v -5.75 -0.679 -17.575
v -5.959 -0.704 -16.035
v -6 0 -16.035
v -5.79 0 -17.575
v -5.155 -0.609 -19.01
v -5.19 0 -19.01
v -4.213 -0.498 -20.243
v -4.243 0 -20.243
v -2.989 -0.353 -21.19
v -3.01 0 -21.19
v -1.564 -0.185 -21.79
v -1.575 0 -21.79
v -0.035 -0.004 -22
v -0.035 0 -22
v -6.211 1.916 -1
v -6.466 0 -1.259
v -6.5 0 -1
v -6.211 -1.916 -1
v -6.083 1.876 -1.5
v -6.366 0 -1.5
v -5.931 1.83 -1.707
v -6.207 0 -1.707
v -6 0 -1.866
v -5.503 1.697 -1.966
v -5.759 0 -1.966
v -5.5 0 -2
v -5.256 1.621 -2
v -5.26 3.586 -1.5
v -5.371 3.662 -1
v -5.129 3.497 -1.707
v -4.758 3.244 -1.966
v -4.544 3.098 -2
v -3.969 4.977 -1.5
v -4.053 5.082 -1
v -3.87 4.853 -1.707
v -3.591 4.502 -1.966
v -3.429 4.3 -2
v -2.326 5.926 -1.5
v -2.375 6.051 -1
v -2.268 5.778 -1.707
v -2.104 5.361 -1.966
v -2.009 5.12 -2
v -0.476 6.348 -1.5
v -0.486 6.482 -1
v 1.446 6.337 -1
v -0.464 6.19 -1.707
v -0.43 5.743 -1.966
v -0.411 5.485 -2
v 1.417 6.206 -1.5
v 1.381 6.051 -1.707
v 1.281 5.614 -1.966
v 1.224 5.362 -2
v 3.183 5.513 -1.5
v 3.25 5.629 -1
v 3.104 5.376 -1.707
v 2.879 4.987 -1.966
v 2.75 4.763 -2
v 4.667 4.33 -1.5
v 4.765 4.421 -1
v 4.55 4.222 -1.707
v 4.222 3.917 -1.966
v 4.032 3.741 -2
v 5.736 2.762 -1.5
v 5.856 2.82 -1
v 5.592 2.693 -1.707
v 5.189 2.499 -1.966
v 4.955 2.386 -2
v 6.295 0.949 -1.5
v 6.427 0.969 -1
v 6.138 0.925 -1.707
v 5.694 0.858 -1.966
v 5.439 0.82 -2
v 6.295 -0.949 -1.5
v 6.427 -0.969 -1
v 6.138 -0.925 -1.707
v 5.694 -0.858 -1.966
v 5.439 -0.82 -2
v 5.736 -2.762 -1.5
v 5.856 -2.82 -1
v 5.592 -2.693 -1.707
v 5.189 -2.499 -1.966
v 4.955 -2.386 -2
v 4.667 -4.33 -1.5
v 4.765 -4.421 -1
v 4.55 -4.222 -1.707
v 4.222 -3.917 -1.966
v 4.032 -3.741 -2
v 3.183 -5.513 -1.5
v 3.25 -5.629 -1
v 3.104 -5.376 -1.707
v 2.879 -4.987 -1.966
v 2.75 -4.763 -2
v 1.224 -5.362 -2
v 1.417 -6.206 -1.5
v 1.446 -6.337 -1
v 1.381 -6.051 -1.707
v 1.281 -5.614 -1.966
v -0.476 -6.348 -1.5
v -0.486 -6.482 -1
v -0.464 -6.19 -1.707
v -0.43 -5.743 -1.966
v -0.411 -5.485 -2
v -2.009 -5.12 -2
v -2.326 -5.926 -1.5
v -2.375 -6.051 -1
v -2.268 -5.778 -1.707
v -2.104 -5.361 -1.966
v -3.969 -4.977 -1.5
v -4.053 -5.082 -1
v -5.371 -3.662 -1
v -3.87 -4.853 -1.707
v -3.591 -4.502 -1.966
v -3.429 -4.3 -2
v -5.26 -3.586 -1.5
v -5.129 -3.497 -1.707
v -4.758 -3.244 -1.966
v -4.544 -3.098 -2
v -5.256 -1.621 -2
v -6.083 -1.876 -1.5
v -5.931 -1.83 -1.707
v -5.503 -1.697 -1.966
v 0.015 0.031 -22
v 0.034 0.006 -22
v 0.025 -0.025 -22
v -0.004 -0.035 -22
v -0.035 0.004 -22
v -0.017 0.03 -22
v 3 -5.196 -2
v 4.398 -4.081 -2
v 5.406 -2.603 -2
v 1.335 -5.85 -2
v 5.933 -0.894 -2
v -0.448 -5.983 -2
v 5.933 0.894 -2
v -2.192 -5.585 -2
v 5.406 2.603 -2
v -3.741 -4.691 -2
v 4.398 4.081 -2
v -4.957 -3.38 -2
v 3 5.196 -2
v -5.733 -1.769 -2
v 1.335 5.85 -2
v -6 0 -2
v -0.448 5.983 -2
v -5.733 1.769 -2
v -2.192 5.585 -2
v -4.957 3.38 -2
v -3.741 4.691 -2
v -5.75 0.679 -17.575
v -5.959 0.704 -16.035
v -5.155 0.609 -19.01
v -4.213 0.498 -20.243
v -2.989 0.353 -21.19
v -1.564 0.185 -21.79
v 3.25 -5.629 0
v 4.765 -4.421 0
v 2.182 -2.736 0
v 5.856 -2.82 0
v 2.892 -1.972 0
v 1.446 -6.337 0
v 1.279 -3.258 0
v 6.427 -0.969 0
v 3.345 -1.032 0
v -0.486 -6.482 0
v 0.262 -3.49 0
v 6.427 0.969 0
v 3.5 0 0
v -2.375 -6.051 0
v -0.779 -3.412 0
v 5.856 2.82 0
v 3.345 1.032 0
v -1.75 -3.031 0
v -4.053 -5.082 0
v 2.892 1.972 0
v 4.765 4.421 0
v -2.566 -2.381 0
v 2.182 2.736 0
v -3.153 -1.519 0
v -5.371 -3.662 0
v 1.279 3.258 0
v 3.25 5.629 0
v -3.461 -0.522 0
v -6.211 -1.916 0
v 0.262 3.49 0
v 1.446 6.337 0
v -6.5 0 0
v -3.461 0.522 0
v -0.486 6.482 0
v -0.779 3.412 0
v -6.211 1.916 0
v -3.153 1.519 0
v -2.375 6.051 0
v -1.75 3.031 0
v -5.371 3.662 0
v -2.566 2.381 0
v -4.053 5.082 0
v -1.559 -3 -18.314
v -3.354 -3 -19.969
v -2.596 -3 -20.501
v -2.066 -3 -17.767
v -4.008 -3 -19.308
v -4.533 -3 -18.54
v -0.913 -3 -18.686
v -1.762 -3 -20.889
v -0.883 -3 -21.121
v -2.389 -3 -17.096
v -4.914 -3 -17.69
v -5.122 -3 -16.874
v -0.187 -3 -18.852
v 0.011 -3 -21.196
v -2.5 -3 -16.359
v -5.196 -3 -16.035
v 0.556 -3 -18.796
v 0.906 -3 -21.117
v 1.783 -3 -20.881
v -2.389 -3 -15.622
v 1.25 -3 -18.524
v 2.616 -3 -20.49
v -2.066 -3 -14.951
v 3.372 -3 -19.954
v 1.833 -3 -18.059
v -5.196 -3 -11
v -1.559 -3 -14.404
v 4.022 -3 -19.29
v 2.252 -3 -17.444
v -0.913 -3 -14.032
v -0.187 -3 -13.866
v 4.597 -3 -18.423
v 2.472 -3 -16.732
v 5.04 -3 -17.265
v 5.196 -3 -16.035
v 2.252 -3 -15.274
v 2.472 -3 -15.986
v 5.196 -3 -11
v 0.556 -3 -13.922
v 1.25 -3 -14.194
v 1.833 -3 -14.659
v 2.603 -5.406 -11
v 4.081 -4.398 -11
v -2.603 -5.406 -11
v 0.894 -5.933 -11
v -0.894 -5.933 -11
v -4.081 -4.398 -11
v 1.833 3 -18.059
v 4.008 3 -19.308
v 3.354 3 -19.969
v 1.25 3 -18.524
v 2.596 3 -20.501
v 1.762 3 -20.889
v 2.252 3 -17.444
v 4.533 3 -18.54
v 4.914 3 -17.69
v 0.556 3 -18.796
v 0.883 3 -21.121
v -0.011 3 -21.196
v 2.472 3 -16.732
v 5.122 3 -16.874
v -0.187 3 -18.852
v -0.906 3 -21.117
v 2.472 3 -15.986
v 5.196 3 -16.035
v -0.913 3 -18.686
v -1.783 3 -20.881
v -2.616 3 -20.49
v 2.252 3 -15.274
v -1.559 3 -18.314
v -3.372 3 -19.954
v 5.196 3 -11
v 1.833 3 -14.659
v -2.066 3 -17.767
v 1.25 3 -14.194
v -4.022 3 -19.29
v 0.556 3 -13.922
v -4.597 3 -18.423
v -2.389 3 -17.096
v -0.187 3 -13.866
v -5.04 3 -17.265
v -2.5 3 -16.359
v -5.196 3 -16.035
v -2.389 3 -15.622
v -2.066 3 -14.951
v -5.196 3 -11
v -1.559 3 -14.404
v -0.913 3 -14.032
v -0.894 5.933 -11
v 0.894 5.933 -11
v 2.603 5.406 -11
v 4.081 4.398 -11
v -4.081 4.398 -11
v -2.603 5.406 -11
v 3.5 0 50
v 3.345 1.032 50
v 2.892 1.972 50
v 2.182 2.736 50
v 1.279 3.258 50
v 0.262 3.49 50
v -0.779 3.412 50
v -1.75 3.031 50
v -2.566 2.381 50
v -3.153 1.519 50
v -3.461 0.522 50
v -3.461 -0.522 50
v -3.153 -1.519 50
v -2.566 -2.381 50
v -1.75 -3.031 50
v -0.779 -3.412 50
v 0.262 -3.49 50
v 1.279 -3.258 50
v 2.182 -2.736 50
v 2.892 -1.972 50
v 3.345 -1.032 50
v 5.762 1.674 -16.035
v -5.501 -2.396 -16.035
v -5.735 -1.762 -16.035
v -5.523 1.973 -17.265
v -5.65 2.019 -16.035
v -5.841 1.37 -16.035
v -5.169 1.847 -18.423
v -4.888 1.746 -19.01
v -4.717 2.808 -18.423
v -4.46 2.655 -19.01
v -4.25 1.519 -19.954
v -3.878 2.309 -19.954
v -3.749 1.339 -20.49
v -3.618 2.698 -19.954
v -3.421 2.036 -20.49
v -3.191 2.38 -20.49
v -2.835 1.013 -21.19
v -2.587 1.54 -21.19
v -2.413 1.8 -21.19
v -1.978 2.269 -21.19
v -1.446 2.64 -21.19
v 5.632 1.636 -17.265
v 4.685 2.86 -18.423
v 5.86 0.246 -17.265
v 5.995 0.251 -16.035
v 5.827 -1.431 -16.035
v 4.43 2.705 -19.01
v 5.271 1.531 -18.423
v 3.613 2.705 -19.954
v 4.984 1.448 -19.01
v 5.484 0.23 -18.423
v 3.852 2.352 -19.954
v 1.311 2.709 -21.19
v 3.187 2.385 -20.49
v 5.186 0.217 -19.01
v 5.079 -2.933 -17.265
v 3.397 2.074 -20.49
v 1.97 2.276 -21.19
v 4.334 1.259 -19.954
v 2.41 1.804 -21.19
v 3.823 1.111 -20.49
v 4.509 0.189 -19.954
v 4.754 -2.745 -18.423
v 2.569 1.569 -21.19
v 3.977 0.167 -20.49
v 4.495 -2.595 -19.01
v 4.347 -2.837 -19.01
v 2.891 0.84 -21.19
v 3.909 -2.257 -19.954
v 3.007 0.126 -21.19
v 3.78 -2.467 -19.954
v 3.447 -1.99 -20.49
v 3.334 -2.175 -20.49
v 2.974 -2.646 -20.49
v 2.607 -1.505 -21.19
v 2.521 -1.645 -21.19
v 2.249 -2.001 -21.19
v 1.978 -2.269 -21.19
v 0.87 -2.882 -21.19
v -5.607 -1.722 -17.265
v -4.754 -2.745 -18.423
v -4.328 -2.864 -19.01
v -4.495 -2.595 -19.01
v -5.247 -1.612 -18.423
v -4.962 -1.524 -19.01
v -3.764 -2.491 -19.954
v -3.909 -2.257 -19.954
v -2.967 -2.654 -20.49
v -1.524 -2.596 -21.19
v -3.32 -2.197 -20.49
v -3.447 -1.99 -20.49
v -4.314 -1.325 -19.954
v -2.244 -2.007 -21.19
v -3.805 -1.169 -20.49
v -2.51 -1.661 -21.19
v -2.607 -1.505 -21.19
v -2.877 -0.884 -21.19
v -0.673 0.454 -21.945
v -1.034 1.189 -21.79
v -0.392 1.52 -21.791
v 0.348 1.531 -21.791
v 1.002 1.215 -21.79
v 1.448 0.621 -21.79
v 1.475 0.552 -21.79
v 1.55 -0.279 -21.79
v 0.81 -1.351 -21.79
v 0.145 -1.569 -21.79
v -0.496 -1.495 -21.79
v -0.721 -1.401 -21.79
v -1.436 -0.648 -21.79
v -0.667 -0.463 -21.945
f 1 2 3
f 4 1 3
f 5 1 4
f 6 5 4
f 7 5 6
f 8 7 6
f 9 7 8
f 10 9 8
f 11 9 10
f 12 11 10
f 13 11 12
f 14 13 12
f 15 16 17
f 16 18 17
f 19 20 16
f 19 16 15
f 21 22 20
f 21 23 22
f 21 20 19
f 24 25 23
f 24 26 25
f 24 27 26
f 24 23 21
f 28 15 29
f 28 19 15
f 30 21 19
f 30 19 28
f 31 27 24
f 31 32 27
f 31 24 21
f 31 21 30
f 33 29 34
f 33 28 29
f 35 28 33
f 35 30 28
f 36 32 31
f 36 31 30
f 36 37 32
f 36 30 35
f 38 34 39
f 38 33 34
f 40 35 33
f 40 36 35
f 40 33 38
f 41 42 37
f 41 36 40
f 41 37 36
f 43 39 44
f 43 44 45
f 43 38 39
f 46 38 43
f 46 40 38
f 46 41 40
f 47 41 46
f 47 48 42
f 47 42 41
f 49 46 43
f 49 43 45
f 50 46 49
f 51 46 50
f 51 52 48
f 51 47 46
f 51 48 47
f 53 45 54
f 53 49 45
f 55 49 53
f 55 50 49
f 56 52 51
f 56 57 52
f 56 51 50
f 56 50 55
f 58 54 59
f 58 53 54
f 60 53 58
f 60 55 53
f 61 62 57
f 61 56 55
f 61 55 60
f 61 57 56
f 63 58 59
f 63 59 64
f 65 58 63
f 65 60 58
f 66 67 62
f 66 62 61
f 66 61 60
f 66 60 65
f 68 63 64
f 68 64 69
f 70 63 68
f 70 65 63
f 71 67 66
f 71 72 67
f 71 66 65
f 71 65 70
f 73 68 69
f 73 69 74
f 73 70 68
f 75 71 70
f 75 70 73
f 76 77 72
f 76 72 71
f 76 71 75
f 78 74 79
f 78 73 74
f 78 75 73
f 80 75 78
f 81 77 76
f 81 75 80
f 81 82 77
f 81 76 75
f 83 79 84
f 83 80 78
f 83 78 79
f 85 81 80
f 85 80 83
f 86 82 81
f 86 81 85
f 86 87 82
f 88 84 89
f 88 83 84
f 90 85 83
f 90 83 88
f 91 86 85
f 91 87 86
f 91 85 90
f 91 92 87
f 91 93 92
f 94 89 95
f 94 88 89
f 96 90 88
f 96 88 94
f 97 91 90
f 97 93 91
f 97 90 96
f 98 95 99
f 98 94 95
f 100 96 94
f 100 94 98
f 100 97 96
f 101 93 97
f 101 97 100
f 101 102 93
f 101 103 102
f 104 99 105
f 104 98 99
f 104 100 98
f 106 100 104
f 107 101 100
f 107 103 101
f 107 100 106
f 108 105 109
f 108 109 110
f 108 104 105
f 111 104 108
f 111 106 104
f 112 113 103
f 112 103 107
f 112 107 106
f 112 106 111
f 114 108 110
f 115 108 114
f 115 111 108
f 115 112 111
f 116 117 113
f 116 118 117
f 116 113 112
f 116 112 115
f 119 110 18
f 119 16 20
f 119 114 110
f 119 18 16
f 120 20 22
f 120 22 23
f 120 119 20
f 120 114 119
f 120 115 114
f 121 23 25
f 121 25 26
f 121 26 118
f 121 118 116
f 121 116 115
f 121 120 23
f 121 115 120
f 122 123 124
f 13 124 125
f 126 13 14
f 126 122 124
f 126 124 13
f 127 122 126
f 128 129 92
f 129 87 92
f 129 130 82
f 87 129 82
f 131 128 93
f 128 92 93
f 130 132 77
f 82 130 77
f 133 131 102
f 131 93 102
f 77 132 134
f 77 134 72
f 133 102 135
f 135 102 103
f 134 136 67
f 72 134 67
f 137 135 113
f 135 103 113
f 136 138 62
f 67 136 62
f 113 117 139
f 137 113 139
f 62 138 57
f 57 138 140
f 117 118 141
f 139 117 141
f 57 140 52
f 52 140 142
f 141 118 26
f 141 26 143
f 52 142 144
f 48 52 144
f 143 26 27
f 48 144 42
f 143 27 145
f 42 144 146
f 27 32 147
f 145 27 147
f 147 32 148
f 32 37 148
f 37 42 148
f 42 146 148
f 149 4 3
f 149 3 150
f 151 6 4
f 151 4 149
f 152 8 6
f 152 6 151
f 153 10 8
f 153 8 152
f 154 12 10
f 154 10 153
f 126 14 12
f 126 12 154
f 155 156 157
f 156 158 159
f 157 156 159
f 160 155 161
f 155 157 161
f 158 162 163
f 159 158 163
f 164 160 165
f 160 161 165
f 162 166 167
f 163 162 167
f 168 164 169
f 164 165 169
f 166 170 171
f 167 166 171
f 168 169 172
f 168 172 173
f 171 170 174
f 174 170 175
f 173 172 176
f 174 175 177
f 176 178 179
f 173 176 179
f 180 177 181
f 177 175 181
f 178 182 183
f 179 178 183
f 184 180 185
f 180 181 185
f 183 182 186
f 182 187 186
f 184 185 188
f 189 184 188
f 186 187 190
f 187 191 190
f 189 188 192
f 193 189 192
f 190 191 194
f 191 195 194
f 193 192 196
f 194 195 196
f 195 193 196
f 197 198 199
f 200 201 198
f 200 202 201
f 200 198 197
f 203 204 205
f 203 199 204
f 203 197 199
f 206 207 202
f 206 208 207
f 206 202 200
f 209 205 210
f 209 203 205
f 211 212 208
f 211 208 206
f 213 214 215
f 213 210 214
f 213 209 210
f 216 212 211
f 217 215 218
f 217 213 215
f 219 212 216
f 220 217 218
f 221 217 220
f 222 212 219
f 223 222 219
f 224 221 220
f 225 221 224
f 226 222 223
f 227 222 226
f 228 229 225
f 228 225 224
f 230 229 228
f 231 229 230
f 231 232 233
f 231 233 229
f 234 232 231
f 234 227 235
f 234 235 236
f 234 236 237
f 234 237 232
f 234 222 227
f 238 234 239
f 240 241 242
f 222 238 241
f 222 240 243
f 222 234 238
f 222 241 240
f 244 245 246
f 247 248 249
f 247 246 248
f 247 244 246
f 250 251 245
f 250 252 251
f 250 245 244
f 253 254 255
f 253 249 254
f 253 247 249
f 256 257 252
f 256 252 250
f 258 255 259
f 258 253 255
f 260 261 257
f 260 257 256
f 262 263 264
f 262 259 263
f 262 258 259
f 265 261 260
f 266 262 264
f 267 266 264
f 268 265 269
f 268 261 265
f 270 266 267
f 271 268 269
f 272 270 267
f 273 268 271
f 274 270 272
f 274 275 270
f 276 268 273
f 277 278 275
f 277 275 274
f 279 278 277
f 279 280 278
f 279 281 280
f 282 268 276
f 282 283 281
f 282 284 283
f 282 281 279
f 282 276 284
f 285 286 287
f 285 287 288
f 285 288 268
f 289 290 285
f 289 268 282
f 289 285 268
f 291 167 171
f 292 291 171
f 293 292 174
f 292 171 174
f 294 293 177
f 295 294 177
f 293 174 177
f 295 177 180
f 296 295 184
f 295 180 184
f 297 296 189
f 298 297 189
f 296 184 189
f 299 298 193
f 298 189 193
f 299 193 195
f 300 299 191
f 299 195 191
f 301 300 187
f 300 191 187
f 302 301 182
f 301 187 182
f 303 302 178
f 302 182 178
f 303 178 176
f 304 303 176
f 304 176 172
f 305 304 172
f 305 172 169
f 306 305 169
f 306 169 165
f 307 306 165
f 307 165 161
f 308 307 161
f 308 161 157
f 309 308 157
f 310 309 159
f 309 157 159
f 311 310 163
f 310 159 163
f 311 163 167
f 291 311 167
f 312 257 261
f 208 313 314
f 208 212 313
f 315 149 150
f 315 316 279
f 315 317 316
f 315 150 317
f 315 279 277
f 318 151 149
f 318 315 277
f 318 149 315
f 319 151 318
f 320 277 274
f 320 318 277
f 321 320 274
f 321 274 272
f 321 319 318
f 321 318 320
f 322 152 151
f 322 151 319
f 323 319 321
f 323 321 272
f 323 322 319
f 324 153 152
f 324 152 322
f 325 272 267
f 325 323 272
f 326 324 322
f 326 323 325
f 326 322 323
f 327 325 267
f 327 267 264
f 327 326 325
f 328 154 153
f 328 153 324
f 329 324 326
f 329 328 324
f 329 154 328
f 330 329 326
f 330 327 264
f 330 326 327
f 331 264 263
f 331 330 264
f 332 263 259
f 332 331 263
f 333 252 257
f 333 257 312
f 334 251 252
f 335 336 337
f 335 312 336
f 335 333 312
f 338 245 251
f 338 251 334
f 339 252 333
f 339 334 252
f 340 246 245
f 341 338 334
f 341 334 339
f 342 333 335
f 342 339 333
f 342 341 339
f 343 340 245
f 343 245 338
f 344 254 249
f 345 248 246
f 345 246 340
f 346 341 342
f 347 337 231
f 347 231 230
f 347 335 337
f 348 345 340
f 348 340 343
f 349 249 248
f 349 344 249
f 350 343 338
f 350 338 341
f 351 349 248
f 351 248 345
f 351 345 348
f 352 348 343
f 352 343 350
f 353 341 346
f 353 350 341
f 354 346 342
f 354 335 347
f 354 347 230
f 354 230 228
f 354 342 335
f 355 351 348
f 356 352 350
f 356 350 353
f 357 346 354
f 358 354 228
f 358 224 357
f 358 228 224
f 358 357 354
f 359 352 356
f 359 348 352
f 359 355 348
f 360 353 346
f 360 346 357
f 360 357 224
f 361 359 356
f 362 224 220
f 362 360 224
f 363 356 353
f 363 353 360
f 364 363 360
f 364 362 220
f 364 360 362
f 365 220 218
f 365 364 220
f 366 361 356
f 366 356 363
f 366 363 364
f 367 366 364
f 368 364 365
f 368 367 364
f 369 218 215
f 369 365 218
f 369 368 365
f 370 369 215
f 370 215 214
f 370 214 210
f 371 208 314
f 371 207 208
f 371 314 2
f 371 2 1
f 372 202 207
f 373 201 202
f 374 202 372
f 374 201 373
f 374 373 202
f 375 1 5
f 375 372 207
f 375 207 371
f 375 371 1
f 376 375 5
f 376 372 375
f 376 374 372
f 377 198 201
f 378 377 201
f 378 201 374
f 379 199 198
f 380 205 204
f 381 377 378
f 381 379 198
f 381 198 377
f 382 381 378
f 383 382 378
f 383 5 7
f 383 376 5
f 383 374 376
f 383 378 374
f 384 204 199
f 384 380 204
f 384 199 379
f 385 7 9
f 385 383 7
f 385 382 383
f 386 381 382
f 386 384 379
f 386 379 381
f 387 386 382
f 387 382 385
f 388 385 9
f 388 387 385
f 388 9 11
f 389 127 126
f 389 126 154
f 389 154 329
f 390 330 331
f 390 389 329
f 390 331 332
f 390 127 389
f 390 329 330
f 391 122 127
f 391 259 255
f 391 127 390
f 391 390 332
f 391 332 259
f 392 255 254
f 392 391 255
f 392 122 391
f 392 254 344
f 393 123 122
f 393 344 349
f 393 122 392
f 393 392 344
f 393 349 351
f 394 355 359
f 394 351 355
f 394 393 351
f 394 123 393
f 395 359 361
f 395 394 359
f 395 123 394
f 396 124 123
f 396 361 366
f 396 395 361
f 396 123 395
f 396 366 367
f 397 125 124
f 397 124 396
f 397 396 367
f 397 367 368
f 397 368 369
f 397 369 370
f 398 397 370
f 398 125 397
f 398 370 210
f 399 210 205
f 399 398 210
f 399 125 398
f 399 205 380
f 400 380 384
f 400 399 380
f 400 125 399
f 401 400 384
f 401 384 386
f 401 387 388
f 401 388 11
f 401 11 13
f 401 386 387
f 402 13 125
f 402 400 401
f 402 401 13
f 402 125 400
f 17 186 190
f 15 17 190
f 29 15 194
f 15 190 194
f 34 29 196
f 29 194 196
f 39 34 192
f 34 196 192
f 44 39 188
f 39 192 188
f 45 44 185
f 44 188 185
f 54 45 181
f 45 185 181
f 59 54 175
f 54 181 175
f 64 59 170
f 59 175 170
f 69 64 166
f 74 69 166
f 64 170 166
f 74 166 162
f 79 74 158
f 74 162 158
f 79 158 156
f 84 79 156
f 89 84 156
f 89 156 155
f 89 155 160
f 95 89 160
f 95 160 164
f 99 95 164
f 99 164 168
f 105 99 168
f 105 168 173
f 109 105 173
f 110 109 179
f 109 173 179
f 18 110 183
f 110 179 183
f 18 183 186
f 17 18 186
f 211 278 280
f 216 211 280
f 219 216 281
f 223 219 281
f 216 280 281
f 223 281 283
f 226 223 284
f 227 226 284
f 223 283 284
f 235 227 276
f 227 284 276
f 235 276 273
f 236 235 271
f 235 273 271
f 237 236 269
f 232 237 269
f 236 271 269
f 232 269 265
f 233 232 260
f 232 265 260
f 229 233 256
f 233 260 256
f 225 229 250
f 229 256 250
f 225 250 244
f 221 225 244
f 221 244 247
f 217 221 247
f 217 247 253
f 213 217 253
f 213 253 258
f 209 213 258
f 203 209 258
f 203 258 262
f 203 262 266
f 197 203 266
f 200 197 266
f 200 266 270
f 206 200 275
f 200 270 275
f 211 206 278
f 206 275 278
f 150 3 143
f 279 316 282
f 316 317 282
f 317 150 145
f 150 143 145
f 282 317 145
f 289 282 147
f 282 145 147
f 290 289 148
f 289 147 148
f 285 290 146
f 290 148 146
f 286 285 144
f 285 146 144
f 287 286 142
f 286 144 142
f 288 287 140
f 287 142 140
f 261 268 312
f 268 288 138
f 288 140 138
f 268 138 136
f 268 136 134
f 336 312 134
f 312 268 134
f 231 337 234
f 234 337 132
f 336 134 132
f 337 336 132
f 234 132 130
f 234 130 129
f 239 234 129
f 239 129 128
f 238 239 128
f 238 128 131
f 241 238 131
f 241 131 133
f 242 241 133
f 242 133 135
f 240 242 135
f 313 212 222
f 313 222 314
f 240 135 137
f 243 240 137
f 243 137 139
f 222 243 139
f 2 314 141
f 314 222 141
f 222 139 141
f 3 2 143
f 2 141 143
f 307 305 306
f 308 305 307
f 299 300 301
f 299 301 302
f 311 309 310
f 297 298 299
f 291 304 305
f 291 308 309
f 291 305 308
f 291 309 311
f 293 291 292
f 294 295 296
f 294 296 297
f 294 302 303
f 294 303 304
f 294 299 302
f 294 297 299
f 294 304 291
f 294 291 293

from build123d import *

# Parameters (mm, degrees)
ESQUISSE1_R             = 3.5
BOSS_EXTRU_1_DEPTH      = 50
ESQUISSE2_R             = 6.5
BOSS_EXTRU_2_DEPTH      = 2
CONG_1_R                = 1
ESQUISSE3_R             = 6
BOSS_EXTRU_3_DEPTH      = 20
ENL_V_START             = -11
ENL_V_MAT_EXTRU_1_DEPTH = 11
CONG_3_R                = 6
ESQUISSE5_R             = 2.5
ENL_V_MAT_EXTRU_2_DEPTH = 6


with BuildPart() as part:
    # Esquisse1 → Boss.-Extru.1 (new body)
    with BuildSketch(Plane.XY):
        Circle(ESQUISSE1_R)
    extrude(amount=BOSS_EXTRU_1_DEPTH)

    # Esquisse2 → Boss.-Extru.2 (add)
    with BuildSketch(Plane(origin=(0, 0, 0), x_dir=(-1, 0, 0), z_dir=(0, 0, -1))):
        Circle(ESQUISSE2_R)
    extrude(amount=BOSS_EXTRU_2_DEPTH)

    # Congé1
    cong_1_edges = [part.edges().sort_by_distance(p)[0] for p in [
        (6.5, 0, -2),
    ]]
    fillet(cong_1_edges, radius=CONG_1_R)

    # Esquisse3 → Boss.-Extru.3 (add)
    with BuildSketch(Plane(origin=(0, 0, -2), x_dir=(-1, 0, 0), z_dir=(0, 0, -1))):
        Circle(ESQUISSE3_R)
    extrude(amount=BOSS_EXTRU_3_DEPTH)

    # Esquisse4 → Enlèv. mat.-Extru.1 (cut)
    with BuildSketch(Plane(origin=(0, 0, -22), x_dir=(-1, 0, 0), z_dir=(0, 0, -1)).offset(ENL_V_START)):
        with BuildLine():
            Line((5.196152423, -3), (-5.196152423, -3))
            ThreePointArc((-5.196152423, -3), (0, -6), (5.196152423, -3))
        make_face()
        with BuildLine():
            ThreePointArc((5.196152423, 3), (0, 6), (-5.196152423, 3))
            Line((-5.196152423, 3), (5.196152423, 3))
        make_face()
    extrude(amount=ENL_V_MAT_EXTRU_1_DEPTH, mode=Mode.SUBTRACT)

    # Congé3
    # the kernel refuses this fillet: 6 mm, written as the material it takes off along each edge
    with BuildSketch(Plane(origin=(0, 0, -22), x_dir=(-0.9930943434085017, 0.11731847718938858, 0), z_dir=(-0.11731847718938858, -0.9930943434085017, 0))) as cong_3_piece_1:
        with BuildLine():
            CenterArc((0.0001, -5.9999), CONG_3_R, 0, 90)
            Line((0.0001, 0.0001), (0.0001, 0.1201))
            ThreePointArc((0.0001, 0.1201), (3.00005, 0.12), (6, 0.12))
            Line((6, 0.12), (6.12, 0))
            ThreePointArc((6.12, 0), (6.12, -2.99995), (6.1201, -5.9999))
            Line((6.1201, -5.9999), (6.0001, -5.9999))
        make_face()
    revolve(axis=Axis((0, 0, -22), (0, 0, -1)), revolution_arc=346.525261187, mode=Mode.SUBTRACT)
    with BuildSketch(Plane(origin=(0, 0, -22), x_dir=(-1, 0, 0), z_dir=(0, -1, 0))) as cong_3_piece_2:
        with BuildLine():
            CenterArc((0.0001, -5.9999), CONG_3_R, 0, 90)
            Line((0.0001, 0.0001), (0.0001, 0.1201))
            ThreePointArc((0.0001, 0.1201), (3.00005, 0.12), (6, 0.12))
            Line((6, 0.12), (6.12, 0))
            ThreePointArc((6.12, 0), (6.12, -2.99995), (6.1201, -5.9999))
            Line((6.1201, -5.9999), (6.0001, -5.9999))
        make_face()
    revolve(axis=Axis((0, 0, -22), (0, 0, -1)), revolution_arc=173.243453158, mode=Mode.SUBTRACT)
    with BuildSketch(Plane(origin=(0, 0, -22), x_dir=(0.9930550201853389, -0.11765086861003726, 0), z_dir=(0.11765086861003726, 0.9930550201853389, 0))) as cong_3_piece_3:
        with BuildLine():
            CenterArc((0.0001, -5.9999), CONG_3_R, 0, 90)
            Line((0.0001, 0.0001), (0.0001, 0.1201))
            ThreePointArc((0.0001, 0.1201), (3.00005, 0.12), (6, 0.12))
            Line((6, 0.12), (6.12, 0))
            ThreePointArc((6.12, 0), (6.12, -2.99995), (6.1201, -5.9999))
            Line((6.1201, -5.9999), (6.0001, -5.9999))
        make_face()
    revolve(axis=Axis((0, 0, -22), (0, 0, -1)), revolution_arc=173.243453158, mode=Mode.SUBTRACT)

    # Esquisse5 → Enlèv. mat.-Extru.2 (cut)
    with BuildSketch(Plane(origin=(0, 3, 0), x_dir=(1, 0, 0), z_dir=(0, 1, 0))):
        with Locations(Location((0, 16.359037674, 0), (0, 0, 180))):
            Circle(ESQUISSE5_R)
    extrude(amount=-ENL_V_MAT_EXTRU_2_DEPTH, mode=Mode.SUBTRACT)


solid = part.part
